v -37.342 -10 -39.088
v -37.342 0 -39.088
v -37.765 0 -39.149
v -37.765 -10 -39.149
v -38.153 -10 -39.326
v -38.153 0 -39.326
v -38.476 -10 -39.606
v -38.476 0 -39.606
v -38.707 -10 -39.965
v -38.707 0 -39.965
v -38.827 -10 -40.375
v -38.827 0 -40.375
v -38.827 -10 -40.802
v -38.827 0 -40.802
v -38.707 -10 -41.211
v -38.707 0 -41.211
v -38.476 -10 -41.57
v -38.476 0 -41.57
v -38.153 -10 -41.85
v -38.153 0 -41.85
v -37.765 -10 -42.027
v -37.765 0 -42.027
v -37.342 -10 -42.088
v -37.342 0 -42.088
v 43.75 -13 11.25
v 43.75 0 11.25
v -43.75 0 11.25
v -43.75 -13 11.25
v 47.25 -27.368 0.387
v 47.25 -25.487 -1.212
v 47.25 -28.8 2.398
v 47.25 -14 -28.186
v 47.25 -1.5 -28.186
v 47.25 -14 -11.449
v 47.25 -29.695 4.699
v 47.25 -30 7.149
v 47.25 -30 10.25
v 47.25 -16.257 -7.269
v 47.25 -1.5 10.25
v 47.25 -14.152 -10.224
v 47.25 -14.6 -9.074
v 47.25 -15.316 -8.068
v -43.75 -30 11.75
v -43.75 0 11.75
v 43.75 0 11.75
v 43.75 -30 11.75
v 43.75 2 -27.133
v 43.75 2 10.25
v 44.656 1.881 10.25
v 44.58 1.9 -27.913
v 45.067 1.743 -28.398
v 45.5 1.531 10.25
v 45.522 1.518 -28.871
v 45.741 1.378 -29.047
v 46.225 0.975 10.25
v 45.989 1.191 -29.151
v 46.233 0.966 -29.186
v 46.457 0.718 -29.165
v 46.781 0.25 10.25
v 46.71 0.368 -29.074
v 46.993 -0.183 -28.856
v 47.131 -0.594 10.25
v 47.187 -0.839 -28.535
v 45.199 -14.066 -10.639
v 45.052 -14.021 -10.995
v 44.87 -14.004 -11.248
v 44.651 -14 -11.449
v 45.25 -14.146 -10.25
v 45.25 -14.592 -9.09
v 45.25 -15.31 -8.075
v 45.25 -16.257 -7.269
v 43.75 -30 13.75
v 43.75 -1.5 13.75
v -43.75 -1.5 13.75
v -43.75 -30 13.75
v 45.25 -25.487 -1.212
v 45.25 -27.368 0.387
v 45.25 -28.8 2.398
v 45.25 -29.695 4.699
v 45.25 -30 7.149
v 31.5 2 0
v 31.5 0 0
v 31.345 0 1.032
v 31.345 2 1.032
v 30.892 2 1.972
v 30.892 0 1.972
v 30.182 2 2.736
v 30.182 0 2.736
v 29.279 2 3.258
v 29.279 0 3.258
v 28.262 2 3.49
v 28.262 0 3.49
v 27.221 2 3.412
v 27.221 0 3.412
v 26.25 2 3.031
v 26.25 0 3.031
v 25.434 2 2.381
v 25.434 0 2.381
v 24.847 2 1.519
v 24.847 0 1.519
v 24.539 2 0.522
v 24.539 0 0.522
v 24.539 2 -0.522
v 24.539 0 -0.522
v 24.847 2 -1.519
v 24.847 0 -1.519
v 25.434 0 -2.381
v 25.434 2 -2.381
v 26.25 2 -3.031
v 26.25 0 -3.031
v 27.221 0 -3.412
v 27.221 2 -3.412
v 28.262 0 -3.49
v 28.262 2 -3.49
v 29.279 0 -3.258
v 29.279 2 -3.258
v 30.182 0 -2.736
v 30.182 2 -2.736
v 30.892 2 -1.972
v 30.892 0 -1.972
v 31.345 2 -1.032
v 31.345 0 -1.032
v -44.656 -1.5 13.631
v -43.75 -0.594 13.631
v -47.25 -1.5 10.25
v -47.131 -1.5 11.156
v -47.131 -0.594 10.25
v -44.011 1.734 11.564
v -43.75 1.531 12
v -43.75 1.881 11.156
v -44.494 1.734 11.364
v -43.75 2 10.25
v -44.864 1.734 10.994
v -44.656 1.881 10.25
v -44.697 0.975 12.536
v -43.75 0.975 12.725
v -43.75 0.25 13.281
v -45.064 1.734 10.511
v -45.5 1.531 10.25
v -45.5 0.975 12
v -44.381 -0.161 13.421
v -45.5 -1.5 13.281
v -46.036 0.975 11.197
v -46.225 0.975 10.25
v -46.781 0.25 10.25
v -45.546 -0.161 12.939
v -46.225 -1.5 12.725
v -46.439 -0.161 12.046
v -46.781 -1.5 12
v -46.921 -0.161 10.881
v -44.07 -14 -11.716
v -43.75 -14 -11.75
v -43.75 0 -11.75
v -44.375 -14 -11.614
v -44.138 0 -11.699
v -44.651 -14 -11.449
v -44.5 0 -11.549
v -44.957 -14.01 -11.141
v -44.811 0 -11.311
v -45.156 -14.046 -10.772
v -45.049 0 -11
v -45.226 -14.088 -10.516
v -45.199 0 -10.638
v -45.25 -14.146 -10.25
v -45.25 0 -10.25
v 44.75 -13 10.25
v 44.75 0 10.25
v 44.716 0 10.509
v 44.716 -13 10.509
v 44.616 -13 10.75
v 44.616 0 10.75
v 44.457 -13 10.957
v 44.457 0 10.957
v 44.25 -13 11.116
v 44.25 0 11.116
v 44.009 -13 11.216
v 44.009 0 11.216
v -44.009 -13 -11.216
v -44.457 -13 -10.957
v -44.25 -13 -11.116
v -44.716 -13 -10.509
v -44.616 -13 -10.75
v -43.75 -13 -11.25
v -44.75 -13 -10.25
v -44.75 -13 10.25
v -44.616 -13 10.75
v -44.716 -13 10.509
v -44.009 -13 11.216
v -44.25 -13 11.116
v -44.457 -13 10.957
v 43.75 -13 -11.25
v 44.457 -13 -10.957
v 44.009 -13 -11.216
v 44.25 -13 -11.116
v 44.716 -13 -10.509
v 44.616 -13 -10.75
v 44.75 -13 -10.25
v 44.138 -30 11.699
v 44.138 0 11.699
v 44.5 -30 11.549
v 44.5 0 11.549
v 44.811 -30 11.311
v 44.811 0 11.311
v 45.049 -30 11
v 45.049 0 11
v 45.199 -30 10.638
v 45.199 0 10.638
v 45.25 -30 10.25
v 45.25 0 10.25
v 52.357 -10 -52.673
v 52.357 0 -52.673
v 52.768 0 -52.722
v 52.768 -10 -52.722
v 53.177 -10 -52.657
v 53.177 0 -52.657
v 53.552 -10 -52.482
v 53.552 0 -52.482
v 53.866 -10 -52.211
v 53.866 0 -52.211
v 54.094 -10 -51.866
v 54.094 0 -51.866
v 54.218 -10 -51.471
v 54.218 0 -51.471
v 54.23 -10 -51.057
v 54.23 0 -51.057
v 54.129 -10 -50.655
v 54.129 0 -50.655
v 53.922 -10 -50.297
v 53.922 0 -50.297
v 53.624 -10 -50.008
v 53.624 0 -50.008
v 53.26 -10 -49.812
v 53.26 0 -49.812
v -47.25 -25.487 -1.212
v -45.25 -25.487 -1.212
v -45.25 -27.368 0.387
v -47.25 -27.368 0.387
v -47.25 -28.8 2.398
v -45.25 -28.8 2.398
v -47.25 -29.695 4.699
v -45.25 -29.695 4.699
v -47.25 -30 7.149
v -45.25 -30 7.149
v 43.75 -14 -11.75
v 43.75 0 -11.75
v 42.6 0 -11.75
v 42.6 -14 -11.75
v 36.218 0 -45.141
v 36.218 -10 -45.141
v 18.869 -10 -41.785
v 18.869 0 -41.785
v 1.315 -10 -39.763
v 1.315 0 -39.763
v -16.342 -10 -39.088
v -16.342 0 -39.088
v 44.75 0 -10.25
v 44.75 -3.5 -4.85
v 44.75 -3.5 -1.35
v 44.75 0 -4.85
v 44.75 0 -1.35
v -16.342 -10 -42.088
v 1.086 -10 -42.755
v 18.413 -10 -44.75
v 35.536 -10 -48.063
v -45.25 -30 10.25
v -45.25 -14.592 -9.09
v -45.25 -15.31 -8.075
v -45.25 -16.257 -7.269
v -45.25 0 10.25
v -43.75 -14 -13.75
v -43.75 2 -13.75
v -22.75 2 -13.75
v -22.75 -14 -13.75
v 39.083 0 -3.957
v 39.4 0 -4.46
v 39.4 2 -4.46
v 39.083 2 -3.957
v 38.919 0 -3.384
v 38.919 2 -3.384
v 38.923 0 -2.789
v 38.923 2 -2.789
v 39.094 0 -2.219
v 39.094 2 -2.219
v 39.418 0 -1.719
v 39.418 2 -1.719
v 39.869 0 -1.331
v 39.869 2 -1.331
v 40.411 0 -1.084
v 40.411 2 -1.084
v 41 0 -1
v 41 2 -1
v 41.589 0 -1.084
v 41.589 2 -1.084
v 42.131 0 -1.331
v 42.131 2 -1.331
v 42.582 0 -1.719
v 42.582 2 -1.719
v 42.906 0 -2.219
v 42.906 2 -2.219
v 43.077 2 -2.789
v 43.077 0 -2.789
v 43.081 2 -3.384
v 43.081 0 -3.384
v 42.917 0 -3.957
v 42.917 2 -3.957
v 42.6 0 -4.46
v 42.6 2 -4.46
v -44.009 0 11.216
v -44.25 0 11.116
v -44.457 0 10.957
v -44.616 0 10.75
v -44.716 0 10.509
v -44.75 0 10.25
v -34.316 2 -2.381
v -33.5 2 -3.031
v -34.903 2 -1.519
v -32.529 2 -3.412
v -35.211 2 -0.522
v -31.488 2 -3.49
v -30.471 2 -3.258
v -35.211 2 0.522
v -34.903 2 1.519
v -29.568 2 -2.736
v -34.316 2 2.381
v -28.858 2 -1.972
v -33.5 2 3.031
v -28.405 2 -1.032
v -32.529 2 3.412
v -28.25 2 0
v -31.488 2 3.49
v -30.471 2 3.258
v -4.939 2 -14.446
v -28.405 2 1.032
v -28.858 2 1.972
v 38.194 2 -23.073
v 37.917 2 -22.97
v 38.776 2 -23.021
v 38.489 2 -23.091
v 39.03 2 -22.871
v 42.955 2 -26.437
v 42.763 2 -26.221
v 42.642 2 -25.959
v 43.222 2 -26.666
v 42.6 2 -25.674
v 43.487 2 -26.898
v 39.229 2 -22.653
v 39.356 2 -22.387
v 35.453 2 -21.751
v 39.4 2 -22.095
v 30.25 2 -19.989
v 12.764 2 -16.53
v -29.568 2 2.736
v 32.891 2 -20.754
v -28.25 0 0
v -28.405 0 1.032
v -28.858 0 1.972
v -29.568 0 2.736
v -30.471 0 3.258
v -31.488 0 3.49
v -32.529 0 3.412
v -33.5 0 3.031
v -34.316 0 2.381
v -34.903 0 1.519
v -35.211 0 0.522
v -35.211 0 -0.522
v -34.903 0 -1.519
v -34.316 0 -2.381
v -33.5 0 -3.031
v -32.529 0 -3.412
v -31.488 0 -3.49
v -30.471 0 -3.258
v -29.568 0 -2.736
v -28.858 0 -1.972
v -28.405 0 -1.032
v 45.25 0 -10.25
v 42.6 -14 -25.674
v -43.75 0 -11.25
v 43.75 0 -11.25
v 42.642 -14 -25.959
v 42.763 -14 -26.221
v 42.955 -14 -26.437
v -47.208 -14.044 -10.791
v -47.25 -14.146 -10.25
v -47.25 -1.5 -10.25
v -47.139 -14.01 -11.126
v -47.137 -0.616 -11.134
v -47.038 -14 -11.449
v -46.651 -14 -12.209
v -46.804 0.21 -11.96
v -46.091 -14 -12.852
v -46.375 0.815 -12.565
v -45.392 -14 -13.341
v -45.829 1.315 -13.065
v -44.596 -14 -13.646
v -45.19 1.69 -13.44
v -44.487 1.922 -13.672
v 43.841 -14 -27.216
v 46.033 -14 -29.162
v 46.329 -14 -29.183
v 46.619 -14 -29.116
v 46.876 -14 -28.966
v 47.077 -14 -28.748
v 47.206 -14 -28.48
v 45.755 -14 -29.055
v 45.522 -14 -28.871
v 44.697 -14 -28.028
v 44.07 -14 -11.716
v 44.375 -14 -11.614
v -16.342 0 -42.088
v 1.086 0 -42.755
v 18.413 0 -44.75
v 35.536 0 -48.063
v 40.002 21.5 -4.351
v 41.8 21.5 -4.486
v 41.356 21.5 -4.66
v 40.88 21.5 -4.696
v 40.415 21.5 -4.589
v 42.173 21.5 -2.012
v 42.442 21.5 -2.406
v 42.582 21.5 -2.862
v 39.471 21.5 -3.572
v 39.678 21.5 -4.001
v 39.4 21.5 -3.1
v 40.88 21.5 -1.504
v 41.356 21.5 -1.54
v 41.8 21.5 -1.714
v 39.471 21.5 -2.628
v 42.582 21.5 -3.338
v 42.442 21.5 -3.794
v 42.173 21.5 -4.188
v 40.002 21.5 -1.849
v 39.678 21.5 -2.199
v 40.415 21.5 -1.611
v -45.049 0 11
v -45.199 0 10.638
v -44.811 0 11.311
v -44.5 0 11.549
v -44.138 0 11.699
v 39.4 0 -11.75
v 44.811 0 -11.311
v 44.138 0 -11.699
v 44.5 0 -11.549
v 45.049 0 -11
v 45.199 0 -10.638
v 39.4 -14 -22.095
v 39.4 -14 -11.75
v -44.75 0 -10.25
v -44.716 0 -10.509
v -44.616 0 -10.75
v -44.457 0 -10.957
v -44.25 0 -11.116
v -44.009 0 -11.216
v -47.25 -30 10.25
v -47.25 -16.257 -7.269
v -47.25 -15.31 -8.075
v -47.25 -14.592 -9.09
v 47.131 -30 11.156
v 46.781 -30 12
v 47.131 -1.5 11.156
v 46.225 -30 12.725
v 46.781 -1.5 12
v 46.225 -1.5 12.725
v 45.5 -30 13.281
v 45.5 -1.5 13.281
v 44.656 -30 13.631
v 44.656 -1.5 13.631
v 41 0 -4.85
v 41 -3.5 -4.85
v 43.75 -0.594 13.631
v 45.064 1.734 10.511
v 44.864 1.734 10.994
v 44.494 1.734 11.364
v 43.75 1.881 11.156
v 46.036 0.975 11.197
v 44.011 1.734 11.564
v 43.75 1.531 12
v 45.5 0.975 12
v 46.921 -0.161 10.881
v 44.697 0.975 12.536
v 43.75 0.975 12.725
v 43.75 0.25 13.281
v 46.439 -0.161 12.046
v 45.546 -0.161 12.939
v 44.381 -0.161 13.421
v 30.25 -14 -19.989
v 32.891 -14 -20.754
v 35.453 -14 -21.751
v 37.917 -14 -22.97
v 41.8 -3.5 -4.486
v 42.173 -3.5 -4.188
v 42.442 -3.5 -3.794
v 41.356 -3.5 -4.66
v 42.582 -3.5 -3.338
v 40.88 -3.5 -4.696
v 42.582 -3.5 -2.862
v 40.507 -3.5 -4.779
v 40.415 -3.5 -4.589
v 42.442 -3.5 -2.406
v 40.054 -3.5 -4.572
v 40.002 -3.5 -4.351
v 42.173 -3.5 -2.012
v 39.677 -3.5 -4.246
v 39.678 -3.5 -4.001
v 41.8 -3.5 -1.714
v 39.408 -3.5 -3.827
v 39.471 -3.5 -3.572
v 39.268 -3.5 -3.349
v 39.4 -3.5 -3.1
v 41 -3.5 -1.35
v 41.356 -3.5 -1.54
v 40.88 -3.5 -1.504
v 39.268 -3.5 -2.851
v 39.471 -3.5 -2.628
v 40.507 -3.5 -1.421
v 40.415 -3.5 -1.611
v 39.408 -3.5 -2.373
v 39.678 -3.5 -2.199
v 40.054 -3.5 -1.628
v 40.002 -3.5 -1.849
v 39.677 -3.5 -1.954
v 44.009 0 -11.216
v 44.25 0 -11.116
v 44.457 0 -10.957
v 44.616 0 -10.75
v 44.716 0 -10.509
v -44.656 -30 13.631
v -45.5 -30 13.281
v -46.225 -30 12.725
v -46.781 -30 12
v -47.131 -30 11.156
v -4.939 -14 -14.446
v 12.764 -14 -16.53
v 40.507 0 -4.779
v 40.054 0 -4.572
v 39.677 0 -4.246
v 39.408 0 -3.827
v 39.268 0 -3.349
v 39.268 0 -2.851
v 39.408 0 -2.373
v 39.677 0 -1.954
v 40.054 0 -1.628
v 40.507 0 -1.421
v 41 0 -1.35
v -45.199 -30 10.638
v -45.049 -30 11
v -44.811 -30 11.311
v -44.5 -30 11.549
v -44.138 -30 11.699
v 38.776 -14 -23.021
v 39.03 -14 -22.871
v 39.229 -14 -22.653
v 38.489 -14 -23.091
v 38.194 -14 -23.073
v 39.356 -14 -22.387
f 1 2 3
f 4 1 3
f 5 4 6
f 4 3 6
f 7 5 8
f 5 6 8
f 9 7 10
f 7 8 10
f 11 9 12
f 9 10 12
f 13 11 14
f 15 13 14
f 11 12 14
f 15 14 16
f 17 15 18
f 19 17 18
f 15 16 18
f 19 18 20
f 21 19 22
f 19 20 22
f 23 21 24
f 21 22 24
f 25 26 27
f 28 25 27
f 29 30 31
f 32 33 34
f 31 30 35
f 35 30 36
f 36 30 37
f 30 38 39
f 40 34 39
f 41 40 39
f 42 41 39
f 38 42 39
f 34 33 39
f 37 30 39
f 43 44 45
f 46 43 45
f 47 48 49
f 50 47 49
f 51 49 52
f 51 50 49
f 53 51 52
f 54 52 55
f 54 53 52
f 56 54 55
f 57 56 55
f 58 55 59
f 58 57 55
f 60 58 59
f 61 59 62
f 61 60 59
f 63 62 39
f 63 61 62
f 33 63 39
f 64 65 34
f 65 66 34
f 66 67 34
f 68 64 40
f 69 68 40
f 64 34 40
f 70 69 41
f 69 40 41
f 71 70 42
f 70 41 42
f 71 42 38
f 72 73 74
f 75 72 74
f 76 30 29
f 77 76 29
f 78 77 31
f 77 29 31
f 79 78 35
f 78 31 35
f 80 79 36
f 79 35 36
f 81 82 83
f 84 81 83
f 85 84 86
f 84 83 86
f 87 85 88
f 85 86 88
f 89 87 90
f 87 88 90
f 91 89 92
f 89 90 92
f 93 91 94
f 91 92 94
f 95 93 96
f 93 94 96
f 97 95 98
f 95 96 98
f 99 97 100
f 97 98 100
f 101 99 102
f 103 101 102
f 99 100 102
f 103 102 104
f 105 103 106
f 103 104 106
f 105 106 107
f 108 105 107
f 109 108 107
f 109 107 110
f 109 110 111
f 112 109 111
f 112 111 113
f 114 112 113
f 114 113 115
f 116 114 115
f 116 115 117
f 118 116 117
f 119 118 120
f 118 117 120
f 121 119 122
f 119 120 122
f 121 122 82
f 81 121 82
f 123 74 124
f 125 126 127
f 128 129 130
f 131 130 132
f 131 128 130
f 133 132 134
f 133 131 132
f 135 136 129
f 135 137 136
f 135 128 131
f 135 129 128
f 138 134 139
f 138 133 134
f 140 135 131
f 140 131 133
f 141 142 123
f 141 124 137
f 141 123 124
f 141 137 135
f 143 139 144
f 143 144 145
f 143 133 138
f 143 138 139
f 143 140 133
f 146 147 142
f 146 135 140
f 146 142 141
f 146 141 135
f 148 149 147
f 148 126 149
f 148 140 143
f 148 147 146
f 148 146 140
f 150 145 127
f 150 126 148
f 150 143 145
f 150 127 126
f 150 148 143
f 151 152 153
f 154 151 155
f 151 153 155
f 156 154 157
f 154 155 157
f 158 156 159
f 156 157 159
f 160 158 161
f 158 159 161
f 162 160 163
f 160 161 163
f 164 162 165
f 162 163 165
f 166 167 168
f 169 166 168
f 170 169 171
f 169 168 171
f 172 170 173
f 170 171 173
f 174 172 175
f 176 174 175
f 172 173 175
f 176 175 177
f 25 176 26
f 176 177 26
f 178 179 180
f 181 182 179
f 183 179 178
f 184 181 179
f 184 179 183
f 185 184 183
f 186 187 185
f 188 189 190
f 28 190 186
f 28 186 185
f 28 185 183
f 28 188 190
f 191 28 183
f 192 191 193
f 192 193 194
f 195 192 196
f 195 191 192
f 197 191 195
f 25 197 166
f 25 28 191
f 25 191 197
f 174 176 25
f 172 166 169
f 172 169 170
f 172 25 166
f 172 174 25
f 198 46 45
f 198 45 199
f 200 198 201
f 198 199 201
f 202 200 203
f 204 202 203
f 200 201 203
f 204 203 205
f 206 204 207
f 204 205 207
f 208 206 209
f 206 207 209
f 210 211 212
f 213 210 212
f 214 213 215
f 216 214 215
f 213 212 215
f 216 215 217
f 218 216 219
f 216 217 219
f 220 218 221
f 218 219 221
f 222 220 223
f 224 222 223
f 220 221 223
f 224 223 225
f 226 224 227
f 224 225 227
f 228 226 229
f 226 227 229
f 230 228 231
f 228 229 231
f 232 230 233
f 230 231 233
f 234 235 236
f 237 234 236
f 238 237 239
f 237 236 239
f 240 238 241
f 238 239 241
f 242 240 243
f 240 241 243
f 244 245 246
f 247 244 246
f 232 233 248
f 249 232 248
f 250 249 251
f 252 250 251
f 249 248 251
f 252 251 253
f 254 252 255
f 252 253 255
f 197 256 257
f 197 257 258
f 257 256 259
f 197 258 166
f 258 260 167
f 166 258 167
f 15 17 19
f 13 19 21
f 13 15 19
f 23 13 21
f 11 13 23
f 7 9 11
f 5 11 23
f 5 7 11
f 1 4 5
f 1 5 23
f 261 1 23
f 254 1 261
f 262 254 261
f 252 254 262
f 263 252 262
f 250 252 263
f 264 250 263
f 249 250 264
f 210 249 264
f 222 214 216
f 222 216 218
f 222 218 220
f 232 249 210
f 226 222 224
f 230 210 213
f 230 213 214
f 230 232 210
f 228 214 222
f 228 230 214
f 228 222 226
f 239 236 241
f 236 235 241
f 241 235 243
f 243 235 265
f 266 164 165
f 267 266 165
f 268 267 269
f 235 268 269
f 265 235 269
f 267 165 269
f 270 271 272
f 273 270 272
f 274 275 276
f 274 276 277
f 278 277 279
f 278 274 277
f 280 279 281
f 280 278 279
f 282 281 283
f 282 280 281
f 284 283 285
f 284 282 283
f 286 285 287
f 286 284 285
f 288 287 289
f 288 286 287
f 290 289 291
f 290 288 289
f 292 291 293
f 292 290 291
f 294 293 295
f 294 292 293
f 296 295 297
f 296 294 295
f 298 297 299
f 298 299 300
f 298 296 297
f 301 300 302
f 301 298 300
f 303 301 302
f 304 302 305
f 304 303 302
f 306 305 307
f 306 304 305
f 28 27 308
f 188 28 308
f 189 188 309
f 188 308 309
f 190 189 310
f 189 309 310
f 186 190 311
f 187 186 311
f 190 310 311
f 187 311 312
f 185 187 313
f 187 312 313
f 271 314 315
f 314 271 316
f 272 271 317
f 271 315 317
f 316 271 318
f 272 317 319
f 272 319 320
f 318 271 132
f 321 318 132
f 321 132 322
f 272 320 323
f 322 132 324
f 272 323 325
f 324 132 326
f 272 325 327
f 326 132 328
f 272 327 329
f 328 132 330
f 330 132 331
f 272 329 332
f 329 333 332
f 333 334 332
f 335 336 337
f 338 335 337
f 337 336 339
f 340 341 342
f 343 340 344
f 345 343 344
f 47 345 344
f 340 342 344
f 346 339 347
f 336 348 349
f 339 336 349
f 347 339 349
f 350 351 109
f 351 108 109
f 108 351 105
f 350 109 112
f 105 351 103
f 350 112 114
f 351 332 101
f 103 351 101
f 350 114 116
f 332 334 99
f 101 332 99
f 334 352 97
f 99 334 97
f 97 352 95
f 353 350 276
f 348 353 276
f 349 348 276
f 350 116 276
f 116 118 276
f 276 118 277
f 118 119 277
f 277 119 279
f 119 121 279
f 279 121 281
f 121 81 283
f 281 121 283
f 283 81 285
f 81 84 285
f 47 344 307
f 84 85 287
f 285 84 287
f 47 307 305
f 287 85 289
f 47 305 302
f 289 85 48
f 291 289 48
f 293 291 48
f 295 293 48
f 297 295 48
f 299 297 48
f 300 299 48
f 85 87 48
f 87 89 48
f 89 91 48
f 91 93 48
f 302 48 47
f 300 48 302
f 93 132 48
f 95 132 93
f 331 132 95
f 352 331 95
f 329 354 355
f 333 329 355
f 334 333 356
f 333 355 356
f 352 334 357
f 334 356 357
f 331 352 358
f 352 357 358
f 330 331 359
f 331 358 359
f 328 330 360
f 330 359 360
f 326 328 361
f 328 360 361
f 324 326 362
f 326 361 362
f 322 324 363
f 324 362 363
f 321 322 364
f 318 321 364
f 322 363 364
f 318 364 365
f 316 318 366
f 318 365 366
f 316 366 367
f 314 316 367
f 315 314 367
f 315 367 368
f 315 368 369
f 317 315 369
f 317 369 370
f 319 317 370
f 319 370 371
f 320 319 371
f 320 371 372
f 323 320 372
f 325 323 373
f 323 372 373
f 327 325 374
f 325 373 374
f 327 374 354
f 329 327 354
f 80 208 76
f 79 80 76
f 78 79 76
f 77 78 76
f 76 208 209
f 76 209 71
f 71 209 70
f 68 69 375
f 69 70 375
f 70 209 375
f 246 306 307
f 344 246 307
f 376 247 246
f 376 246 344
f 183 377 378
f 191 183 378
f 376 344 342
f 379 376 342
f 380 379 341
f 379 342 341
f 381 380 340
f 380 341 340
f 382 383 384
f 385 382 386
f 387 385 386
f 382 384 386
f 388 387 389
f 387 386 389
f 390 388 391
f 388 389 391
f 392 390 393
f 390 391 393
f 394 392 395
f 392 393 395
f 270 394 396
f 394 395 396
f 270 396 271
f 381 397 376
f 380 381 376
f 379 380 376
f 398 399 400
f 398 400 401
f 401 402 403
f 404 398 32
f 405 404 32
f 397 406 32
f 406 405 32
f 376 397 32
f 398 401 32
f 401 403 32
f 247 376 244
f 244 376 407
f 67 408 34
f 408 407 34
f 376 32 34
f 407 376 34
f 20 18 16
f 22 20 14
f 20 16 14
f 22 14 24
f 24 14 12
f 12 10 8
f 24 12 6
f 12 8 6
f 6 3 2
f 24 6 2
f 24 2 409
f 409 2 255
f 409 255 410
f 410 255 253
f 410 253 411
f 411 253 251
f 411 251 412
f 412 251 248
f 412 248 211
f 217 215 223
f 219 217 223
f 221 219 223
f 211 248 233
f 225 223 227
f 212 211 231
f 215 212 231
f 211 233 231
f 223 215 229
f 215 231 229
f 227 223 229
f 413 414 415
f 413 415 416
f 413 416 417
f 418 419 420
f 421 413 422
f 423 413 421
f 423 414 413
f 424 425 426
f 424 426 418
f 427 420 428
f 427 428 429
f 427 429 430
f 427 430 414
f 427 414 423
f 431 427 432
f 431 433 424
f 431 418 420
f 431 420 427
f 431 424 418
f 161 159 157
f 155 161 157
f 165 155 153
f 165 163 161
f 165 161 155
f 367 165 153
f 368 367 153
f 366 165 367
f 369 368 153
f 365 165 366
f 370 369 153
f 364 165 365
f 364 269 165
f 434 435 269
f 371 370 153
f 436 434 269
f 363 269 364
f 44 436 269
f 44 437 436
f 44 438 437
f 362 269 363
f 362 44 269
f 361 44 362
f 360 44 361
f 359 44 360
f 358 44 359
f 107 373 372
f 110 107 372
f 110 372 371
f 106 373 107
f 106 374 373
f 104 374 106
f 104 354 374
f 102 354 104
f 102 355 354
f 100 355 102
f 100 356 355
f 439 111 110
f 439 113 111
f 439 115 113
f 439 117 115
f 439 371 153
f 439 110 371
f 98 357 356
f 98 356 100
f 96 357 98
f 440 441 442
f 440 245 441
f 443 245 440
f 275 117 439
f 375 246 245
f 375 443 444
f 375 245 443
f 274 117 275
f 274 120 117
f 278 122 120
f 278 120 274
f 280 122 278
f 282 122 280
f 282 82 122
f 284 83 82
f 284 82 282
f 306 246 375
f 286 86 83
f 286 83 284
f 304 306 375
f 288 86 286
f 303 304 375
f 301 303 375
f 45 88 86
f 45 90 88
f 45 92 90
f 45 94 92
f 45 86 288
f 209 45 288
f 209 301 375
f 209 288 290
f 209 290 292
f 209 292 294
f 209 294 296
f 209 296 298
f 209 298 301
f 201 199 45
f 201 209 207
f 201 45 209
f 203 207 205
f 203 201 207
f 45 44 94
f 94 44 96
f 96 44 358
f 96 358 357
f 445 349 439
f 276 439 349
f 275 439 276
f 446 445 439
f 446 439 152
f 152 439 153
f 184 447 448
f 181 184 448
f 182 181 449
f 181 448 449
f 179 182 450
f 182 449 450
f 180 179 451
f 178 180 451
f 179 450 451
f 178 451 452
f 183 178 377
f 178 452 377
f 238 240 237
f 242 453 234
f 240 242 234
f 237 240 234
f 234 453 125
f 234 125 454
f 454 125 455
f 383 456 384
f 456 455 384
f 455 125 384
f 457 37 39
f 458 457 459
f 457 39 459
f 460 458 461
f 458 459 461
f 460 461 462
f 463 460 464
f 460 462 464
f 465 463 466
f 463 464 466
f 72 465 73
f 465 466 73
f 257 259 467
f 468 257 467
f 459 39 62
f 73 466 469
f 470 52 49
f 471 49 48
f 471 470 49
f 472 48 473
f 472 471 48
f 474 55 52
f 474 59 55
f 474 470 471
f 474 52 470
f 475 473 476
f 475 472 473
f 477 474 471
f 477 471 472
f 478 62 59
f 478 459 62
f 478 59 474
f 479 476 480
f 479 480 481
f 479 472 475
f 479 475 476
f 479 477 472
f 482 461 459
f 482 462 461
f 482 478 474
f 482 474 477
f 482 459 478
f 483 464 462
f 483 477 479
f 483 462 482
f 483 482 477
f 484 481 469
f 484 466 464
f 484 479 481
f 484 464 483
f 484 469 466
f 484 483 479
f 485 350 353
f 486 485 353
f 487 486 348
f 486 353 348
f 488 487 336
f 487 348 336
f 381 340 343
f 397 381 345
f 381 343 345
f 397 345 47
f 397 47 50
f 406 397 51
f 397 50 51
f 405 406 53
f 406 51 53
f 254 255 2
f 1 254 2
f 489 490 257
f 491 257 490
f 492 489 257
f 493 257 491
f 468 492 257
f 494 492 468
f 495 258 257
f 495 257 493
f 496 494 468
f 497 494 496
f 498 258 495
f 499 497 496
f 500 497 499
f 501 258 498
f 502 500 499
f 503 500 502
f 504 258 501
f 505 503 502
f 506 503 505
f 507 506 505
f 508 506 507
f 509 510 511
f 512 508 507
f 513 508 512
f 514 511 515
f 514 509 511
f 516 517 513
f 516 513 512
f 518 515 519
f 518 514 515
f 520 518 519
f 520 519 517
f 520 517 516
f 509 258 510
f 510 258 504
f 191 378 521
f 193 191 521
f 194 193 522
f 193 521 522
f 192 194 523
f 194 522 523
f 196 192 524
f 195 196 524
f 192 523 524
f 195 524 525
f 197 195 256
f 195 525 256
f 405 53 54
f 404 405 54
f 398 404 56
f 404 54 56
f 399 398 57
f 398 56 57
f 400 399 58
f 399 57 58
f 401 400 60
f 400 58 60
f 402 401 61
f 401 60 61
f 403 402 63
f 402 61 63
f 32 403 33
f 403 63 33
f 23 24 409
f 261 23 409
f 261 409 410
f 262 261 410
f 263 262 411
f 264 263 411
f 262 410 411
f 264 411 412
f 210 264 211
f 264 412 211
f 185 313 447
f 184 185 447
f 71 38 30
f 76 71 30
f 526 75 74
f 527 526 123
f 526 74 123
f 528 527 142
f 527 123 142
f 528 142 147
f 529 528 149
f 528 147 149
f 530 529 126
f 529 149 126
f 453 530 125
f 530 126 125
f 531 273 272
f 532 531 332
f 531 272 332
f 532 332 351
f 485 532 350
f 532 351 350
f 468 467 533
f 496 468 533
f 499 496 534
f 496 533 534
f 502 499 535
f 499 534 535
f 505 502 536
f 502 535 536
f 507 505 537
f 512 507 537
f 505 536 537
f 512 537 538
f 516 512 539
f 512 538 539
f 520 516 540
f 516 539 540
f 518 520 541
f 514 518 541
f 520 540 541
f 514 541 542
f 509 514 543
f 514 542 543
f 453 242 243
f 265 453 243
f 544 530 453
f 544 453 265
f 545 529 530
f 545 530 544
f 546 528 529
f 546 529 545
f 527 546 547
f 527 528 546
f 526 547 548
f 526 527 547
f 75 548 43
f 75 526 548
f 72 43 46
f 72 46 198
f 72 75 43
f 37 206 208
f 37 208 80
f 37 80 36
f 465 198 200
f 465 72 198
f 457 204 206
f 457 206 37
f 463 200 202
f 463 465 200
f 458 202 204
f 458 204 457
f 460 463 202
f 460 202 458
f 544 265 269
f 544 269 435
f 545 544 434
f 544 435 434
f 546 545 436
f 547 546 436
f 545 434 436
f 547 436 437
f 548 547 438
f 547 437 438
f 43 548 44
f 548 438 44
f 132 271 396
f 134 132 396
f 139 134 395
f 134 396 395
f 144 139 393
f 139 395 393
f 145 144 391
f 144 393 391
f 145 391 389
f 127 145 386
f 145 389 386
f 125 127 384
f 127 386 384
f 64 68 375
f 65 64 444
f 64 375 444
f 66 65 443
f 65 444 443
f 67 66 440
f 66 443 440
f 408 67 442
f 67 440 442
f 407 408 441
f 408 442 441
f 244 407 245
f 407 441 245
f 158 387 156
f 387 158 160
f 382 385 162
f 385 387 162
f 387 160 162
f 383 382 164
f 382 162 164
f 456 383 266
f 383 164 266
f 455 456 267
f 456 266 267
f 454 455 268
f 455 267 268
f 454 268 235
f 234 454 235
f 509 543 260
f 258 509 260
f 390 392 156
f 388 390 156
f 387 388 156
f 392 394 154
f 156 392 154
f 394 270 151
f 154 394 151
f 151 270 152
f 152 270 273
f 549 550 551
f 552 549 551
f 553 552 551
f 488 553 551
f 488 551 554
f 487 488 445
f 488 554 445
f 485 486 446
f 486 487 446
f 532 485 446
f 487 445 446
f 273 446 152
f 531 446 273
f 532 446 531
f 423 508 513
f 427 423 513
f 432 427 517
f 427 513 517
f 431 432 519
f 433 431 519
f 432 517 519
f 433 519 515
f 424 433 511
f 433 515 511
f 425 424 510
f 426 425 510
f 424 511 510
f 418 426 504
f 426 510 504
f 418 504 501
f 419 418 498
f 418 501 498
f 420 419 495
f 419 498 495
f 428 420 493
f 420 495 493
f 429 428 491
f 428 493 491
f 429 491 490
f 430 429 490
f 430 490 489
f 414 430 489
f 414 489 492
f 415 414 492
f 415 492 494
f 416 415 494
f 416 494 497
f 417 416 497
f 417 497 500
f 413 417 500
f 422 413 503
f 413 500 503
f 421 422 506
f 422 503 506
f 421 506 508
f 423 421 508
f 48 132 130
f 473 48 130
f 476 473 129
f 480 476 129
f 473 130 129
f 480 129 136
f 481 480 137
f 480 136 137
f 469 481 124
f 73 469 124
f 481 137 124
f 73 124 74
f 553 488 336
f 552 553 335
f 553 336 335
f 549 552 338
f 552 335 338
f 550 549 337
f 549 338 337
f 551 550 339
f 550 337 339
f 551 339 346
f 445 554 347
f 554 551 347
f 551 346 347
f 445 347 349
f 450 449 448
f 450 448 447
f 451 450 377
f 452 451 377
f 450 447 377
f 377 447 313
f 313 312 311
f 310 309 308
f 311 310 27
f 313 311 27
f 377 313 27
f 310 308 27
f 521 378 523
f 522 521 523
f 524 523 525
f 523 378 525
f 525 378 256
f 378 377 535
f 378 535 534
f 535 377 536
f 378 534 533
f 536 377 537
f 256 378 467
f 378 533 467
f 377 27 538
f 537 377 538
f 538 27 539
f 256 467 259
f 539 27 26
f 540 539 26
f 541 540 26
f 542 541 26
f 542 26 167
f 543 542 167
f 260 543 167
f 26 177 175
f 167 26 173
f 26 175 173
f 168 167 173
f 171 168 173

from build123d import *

# Parameters (mm, degrees)
F1_DEPTH      = 13
F3_DEPTH      = 3.5
F4_R          = 1.6
F5_DEPTH      = 25
F6_R          = 3.5
F7_DEPTH      = 2
F8_DEPTH      = 30
F10_DEPTH     = 94.501
F12_DEPTH     = 10
F13_T1_DEPTH  = 87.5
F13_T3_DEPTH  = 47.186229439
F13_T5_DEPTH  = 29.25
F13_T8_ANGLE  = 90
F13_T10_ANGLE = 90


# Not quite as in the source:
# - a fillet or chamfer that OpenCascade refuses, or shapes differently, is made with other operations: its cross-section is extruded or revolved along the edge and cut away or added


with BuildPart() as f1:
    # F0 (on Front) → F1 (new body)
    with BuildSketch(Plane.XZ):
        with BuildLine():
            Line((-43.75, -11.25), (43.75, -11.25))
            ThreePointArc((43.75, -11.25), (44.4571067812, -10.9571067812), (44.75, -10.25))
            Line((44.75, -10.25), (44.75, 10.25))
            ThreePointArc((44.75, 10.25), (44.4571067812, 10.9571067812), (43.75, 11.25))
            Line((43.75, 11.25), (-43.75, 11.25))
            ThreePointArc((-43.75, 11.25), (-44.4571067812, 10.9571067812), (-44.75, 10.25))
            Line((-44.75, 10.25), (-44.75, -10.25))
            ThreePointArc((-44.75, -10.25), (-44.4571067812, -10.9571067812), (-43.75, -11.25))
        make_face()
    extrude(amount=F1_DEPTH)

    # F2 (on face) → F3 (cut)
    with BuildSketch(Plane(origin=(0, 0, 0), x_dir=(-1, 0, 0), z_dir=(0, 1, 0))):
        with BuildLine():
            Line((-44.75, -1.35), (-44.75, -4.85))
            Line((-44.75, -4.85), (-41, -4.85))
            ThreePointArc((-41, -4.85), (-39.25, -3.1), (-41, -1.35))
            Line((-41, -1.35), (-44.75, -1.35))
        make_face()
    extrude(amount=-F3_DEPTH, mode=Mode.SUBTRACT)

    # F4 (on face) → F5 (join)
    with BuildSketch(Plane(origin=(0, -3.5, 0), x_dir=(-1, 0, 0), z_dir=(0, 1, 0))):
        with Locations((-41, -3.1)):
            Circle(F4_R)
    extrude(amount=F5_DEPTH)


with BuildPart() as f7:
    # F6 (on Front) → F7 (new body)
    with BuildSketch(Plane.XZ):
        with BuildLine():
            ThreePointArc((43.75, 11.75), (44.8106601718, 11.3106601718), (45.25, 10.25))
            Line((45.25, 10.25), (45.25, -1.35))
            Line((45.25, -1.35), (45.25, -4.85))
            Line((45.25, -4.85), (45.25, -10.25))
            ThreePointArc((45.25, -10.25), (44.8106601718, -11.3106601718), (43.75, -11.75))
            Line((43.75, -11.75), (42.6, -11.75))
            Line((42.6, -11.75), (42.6, -25.6736123026))
            ThreePointArc((42.6, -25.6736123026), (42.6929458463, -26.0946262718), (42.9545055245, -26.4373772417))
            ThreePointArc((42.9545055245, -26.4373772417), (44.2728453868, -27.6177334706), (45.5216463266, -28.8714308156))
            ThreePointArc((45.5216463266, -28.8714308156), (46.6185419424, -29.1158405602), (47.25, -28.186229439))
            Line((47.25, -28.186229439), (47.25, -23.3814297613))
            Line((47.25, -23.3814297613), (47.25, -10.25))
            Line((47.25, -10.25), (47.25, -4.85))
            Line((47.25, -4.85), (47.25, -1.35))
            Line((47.25, -1.35), (47.25, 10.25))
            ThreePointArc((47.25, 10.25), (46.2248737342, 12.7248737342), (43.75, 13.75))
            Line((43.75, 13.75), (-43.75, 13.75))
            ThreePointArc((-43.75, 13.75), (-46.2248737342, 12.7248737342), (-47.25, 10.25))
            Line((-47.25, 10.25), (-47.25, -10.25))
            ThreePointArc((-47.25, -10.25), (-46.2248737342, -12.7248737342), (-43.75, -13.75))
            Line((-43.75, -13.75), (-22.75, -13.75))
            ThreePointArc((-22.75, -13.75), (3.9329912025, -15.3151762113), (30.25, -19.9892369764))
            ThreePointArc((30.25, -19.9892369764), (34.1829257127, -21.2241281647), (37.917097158, -22.9702165145))
            ThreePointArc((37.917097158, -22.9702165145), (38.9084767241, -22.9556183115), (39.4, -22.0945425767))
            Line((39.4, -22.0945425767), (39.4, -11.75))
            Line((39.4, -11.75), (-43.75, -11.75))
            ThreePointArc((-43.75, -11.75), (-44.8106601718, -11.3106601718), (-45.25, -10.25))
            Line((-45.25, -10.25), (-45.25, 10.25))
            ThreePointArc((-45.25, 10.25), (-44.8106601718, 11.3106601718), (-43.75, 11.75))
            Line((-43.75, 11.75), (43.75, 11.75))
        make_face()
        with BuildLine():
            Line((45.25, -1.35), (45.25, 10.25))
            ThreePointArc((45.25, 10.25), (44.8106601718, 11.3106601718), (43.75, 11.75))
            Line((43.75, 11.75), (-43.75, 11.75))
            ThreePointArc((-43.75, 11.75), (-44.8106601718, 11.3106601718), (-45.25, 10.25))
            Line((-45.25, 10.25), (-45.25, -10.25))
            ThreePointArc((-45.25, -10.25), (-44.8106601718, -11.3106601718), (-43.75, -11.75))
            Line((-43.75, -11.75), (39.4, -11.75))
            Line((39.4, -11.75), (39.4, -4.4601470509))
            ThreePointArc((39.4, -4.4601470509), (41, -1), (42.6, -4.4601470509))
            Line((42.6, -4.4601470509), (42.6, -11.75))
            Line((42.6, -11.75), (43.75, -11.75))
            ThreePointArc((43.75, -11.75), (44.8106601718, -11.3106601718), (45.25, -10.25))
            Line((45.25, -10.25), (45.25, -4.85))
            Line((45.25, -4.85), (45.25, -1.35))
        make_face()
        with Locations((-31.75, 0)):
            Circle(F6_R, mode=Mode.SUBTRACT)
        with Locations((28, 0)):
            Circle(F6_R, mode=Mode.SUBTRACT)
    extrude(amount=-F7_DEPTH)

    # F6 (on Front) → F8 (join)
    with BuildSketch(Plane.XZ):
        with BuildLine():
            ThreePointArc((43.75, 11.75), (44.8106601718, 11.3106601718), (45.25, 10.25))
            Line((45.25, 10.25), (45.25, -1.35))
            Line((45.25, -1.35), (45.25, -4.85))
            Line((45.25, -4.85), (45.25, -10.25))
            ThreePointArc((45.25, -10.25), (44.8106601718, -11.3106601718), (43.75, -11.75))
            Line((43.75, -11.75), (42.6, -11.75))
            Line((42.6, -11.75), (42.6, -25.6736123026))
            ThreePointArc((42.6, -25.6736123026), (42.6929458463, -26.0946262718), (42.9545055245, -26.4373772417))
            ThreePointArc((42.9545055245, -26.4373772417), (44.2728453868, -27.6177334706), (45.5216463266, -28.8714308156))
            ThreePointArc((45.5216463266, -28.8714308156), (46.6185419424, -29.1158405602), (47.25, -28.186229439))
            Line((47.25, -28.186229439), (47.25, -23.3814297613))
            Line((47.25, -23.3814297613), (47.25, -10.25))
            Line((47.25, -10.25), (47.25, -4.85))
            Line((47.25, -4.85), (47.25, -1.35))
            Line((47.25, -1.35), (47.25, 10.25))
            ThreePointArc((47.25, 10.25), (46.2248737342, 12.7248737342), (43.75, 13.75))
            Line((43.75, 13.75), (-43.75, 13.75))
            ThreePointArc((-43.75, 13.75), (-46.2248737342, 12.7248737342), (-47.25, 10.25))
            Line((-47.25, 10.25), (-47.25, -10.25))
            ThreePointArc((-47.25, -10.25), (-46.2248737342, -12.7248737342), (-43.75, -13.75))
            Line((-43.75, -13.75), (-22.75, -13.75))
            ThreePointArc((-22.75, -13.75), (3.9329912025, -15.3151762113), (30.25, -19.9892369764))
            ThreePointArc((30.25, -19.9892369764), (34.1829257127, -21.2241281647), (37.917097158, -22.9702165145))
            ThreePointArc((37.917097158, -22.9702165145), (38.9084767241, -22.9556183115), (39.4, -22.0945425767))
            Line((39.4, -22.0945425767), (39.4, -11.75))
            Line((39.4, -11.75), (-43.75, -11.75))
            ThreePointArc((-43.75, -11.75), (-44.8106601718, -11.3106601718), (-45.25, -10.25))
            Line((-45.25, -10.25), (-45.25, 10.25))
            ThreePointArc((-45.25, 10.25), (-44.8106601718, 11.3106601718), (-43.75, 11.75))
            Line((-43.75, 11.75), (43.75, 11.75))
        make_face()
    extrude(amount=F8_DEPTH)

    # F9 (on face) → F10 (cut, through all)
    with BuildSketch(Plane.YZ.offset(47.25)):
        with BuildLine():
            Line((-30, -28.186229439), (-14, -28.186229439))
            Line((-14, -28.186229439), (-14, -11.4492685028))
            ThreePointArc((-14, -11.4492685028), (-14.6002039231, -9.074022309), (-16.2567177926, -7.2690289486))
            Line((-16.2567177926, -7.2690289486), (-25.4865644149, -1.2119421027))
            ThreePointArc((-25.4865644149, -1.2119421027), (-28.7995921539, 2.3980446179), (-30, 7.1485370056))
            Line((-30, 7.1485370056), (-30, -28.186229439))
        make_face()
        Polygon((-34.3077805638, -31.5740667284), (-14, -31.5740667284), (-14, -28.186229439), (-30, -28.186229439), (-30, 7.1485370056), (-30, 10.25), (-30, 16.696613282), (-34.3077805638, 16.696613282), align=None)
    extrude(amount=-F10_DEPTH, mode=Mode.SUBTRACT)

    # F13: fillet of radius 3.5 on 5 edges, made by hand

    # F13_s2 → F13_t1 (cut)
    with BuildSketch(Plane.YZ.offset(-43.75)):
        with BuildLine():
            ThreePointArc((2, 10.25), (0.9748737342, 12.7248737342), (-1.5, 13.75))
            Line((-1.5, 13.75), (2, 13.75))
            Line((2, 13.75), (2, 10.25))
        make_face()
    extrude(amount=F13_T1_DEPTH, mode=Mode.SUBTRACT)

    # F13_s4 → F13_t3 (cut)
    with BuildSketch(Plane.XY.offset(-36.936229439)):
        with BuildLine():
            ThreePointArc((43.75, 2), (46.2248737342, 0.9748737342), (47.25, -1.5))
            Line((47.25, -1.5), (47.25, 2))
            Line((47.25, 2), (43.75, 2))
        make_face()
    extrude(amount=F13_T3_DEPTH, mode=Mode.SUBTRACT)

    # F13_s6 → F13_t5 (cut)
    with BuildSketch(Plane.XY.offset(-19)):
        with BuildLine():
            ThreePointArc((-43.75, 2), (-46.2248737342, 0.9748737342), (-47.25, -1.5))
            Line((-47.25, -1.5), (-47.25, 2))
            Line((-47.25, 2), (-43.75, 2))
        make_face()
    extrude(amount=F13_T5_DEPTH, mode=Mode.SUBTRACT)

    # F13_s7 → F13_t8 (revolve, cut)
    with BuildSketch(Plane.XY.offset(10.25)):
        with BuildLine():
            ThreePointArc((43.75, 2), (46.2248737342, 0.9748737342), (47.25, -1.5))
            Line((47.25, -1.5), (47.25, 2))
            Line((47.25, 2), (43.75, 2))
        make_face()
    revolve(axis=Axis((43.75, 2, 10.25), (0, -1, 0)), revolution_arc=F13_T8_ANGLE, mode=Mode.SUBTRACT)

    # F13_s9 → F13_t10 (revolve, cut)
    with BuildSketch(Plane.YZ.offset(-43.75)):
        with BuildLine():
            ThreePointArc((2, 10.25), (0.9748737342, 12.7248737342), (-1.5, 13.75))
            Line((-1.5, 13.75), (2, 13.75))
            Line((2, 13.75), (2, 10.25))
        make_face()
    revolve(axis=Axis((-43.75, 2, 10.25), (0, -1, 0)), revolution_arc=F13_T10_ANGLE, mode=Mode.SUBTRACT)


with BuildPart() as f12:
    # F11 (on Front) → F12 (new body)
    with BuildSketch(Plane.XZ):
        with BuildLine():
            Line((-37.3423290549, -42.0881269919), (-16.3423290549, -42.0881269919))
            ThreePointArc((-16.3423290549, -42.0881269919), (18.412506359, -44.7499115968), (52.3566596423, -52.6731773254))
            ThreePointArc((52.3566596423, -52.6731773254), (54.169539989, -51.6724622056), (53.2596935507, -49.812315609))
            ThreePointArc((53.2596935507, -49.812315609), (18.8693514371, -41.7849002014), (-16.3423290549, -39.0881269919))
            Line((-16.3423290549, -39.0881269919), (-37.3423290549, -39.0881269919))
            ThreePointArc((-37.3423290549, -39.0881269919), (-38.8423290549, -40.5881269919), (-37.3423290549, -42.0881269919))
        make_face()
    extrude(amount=F12_DEPTH)


solid = Compound([f1.part, f7.part, f12.part])
